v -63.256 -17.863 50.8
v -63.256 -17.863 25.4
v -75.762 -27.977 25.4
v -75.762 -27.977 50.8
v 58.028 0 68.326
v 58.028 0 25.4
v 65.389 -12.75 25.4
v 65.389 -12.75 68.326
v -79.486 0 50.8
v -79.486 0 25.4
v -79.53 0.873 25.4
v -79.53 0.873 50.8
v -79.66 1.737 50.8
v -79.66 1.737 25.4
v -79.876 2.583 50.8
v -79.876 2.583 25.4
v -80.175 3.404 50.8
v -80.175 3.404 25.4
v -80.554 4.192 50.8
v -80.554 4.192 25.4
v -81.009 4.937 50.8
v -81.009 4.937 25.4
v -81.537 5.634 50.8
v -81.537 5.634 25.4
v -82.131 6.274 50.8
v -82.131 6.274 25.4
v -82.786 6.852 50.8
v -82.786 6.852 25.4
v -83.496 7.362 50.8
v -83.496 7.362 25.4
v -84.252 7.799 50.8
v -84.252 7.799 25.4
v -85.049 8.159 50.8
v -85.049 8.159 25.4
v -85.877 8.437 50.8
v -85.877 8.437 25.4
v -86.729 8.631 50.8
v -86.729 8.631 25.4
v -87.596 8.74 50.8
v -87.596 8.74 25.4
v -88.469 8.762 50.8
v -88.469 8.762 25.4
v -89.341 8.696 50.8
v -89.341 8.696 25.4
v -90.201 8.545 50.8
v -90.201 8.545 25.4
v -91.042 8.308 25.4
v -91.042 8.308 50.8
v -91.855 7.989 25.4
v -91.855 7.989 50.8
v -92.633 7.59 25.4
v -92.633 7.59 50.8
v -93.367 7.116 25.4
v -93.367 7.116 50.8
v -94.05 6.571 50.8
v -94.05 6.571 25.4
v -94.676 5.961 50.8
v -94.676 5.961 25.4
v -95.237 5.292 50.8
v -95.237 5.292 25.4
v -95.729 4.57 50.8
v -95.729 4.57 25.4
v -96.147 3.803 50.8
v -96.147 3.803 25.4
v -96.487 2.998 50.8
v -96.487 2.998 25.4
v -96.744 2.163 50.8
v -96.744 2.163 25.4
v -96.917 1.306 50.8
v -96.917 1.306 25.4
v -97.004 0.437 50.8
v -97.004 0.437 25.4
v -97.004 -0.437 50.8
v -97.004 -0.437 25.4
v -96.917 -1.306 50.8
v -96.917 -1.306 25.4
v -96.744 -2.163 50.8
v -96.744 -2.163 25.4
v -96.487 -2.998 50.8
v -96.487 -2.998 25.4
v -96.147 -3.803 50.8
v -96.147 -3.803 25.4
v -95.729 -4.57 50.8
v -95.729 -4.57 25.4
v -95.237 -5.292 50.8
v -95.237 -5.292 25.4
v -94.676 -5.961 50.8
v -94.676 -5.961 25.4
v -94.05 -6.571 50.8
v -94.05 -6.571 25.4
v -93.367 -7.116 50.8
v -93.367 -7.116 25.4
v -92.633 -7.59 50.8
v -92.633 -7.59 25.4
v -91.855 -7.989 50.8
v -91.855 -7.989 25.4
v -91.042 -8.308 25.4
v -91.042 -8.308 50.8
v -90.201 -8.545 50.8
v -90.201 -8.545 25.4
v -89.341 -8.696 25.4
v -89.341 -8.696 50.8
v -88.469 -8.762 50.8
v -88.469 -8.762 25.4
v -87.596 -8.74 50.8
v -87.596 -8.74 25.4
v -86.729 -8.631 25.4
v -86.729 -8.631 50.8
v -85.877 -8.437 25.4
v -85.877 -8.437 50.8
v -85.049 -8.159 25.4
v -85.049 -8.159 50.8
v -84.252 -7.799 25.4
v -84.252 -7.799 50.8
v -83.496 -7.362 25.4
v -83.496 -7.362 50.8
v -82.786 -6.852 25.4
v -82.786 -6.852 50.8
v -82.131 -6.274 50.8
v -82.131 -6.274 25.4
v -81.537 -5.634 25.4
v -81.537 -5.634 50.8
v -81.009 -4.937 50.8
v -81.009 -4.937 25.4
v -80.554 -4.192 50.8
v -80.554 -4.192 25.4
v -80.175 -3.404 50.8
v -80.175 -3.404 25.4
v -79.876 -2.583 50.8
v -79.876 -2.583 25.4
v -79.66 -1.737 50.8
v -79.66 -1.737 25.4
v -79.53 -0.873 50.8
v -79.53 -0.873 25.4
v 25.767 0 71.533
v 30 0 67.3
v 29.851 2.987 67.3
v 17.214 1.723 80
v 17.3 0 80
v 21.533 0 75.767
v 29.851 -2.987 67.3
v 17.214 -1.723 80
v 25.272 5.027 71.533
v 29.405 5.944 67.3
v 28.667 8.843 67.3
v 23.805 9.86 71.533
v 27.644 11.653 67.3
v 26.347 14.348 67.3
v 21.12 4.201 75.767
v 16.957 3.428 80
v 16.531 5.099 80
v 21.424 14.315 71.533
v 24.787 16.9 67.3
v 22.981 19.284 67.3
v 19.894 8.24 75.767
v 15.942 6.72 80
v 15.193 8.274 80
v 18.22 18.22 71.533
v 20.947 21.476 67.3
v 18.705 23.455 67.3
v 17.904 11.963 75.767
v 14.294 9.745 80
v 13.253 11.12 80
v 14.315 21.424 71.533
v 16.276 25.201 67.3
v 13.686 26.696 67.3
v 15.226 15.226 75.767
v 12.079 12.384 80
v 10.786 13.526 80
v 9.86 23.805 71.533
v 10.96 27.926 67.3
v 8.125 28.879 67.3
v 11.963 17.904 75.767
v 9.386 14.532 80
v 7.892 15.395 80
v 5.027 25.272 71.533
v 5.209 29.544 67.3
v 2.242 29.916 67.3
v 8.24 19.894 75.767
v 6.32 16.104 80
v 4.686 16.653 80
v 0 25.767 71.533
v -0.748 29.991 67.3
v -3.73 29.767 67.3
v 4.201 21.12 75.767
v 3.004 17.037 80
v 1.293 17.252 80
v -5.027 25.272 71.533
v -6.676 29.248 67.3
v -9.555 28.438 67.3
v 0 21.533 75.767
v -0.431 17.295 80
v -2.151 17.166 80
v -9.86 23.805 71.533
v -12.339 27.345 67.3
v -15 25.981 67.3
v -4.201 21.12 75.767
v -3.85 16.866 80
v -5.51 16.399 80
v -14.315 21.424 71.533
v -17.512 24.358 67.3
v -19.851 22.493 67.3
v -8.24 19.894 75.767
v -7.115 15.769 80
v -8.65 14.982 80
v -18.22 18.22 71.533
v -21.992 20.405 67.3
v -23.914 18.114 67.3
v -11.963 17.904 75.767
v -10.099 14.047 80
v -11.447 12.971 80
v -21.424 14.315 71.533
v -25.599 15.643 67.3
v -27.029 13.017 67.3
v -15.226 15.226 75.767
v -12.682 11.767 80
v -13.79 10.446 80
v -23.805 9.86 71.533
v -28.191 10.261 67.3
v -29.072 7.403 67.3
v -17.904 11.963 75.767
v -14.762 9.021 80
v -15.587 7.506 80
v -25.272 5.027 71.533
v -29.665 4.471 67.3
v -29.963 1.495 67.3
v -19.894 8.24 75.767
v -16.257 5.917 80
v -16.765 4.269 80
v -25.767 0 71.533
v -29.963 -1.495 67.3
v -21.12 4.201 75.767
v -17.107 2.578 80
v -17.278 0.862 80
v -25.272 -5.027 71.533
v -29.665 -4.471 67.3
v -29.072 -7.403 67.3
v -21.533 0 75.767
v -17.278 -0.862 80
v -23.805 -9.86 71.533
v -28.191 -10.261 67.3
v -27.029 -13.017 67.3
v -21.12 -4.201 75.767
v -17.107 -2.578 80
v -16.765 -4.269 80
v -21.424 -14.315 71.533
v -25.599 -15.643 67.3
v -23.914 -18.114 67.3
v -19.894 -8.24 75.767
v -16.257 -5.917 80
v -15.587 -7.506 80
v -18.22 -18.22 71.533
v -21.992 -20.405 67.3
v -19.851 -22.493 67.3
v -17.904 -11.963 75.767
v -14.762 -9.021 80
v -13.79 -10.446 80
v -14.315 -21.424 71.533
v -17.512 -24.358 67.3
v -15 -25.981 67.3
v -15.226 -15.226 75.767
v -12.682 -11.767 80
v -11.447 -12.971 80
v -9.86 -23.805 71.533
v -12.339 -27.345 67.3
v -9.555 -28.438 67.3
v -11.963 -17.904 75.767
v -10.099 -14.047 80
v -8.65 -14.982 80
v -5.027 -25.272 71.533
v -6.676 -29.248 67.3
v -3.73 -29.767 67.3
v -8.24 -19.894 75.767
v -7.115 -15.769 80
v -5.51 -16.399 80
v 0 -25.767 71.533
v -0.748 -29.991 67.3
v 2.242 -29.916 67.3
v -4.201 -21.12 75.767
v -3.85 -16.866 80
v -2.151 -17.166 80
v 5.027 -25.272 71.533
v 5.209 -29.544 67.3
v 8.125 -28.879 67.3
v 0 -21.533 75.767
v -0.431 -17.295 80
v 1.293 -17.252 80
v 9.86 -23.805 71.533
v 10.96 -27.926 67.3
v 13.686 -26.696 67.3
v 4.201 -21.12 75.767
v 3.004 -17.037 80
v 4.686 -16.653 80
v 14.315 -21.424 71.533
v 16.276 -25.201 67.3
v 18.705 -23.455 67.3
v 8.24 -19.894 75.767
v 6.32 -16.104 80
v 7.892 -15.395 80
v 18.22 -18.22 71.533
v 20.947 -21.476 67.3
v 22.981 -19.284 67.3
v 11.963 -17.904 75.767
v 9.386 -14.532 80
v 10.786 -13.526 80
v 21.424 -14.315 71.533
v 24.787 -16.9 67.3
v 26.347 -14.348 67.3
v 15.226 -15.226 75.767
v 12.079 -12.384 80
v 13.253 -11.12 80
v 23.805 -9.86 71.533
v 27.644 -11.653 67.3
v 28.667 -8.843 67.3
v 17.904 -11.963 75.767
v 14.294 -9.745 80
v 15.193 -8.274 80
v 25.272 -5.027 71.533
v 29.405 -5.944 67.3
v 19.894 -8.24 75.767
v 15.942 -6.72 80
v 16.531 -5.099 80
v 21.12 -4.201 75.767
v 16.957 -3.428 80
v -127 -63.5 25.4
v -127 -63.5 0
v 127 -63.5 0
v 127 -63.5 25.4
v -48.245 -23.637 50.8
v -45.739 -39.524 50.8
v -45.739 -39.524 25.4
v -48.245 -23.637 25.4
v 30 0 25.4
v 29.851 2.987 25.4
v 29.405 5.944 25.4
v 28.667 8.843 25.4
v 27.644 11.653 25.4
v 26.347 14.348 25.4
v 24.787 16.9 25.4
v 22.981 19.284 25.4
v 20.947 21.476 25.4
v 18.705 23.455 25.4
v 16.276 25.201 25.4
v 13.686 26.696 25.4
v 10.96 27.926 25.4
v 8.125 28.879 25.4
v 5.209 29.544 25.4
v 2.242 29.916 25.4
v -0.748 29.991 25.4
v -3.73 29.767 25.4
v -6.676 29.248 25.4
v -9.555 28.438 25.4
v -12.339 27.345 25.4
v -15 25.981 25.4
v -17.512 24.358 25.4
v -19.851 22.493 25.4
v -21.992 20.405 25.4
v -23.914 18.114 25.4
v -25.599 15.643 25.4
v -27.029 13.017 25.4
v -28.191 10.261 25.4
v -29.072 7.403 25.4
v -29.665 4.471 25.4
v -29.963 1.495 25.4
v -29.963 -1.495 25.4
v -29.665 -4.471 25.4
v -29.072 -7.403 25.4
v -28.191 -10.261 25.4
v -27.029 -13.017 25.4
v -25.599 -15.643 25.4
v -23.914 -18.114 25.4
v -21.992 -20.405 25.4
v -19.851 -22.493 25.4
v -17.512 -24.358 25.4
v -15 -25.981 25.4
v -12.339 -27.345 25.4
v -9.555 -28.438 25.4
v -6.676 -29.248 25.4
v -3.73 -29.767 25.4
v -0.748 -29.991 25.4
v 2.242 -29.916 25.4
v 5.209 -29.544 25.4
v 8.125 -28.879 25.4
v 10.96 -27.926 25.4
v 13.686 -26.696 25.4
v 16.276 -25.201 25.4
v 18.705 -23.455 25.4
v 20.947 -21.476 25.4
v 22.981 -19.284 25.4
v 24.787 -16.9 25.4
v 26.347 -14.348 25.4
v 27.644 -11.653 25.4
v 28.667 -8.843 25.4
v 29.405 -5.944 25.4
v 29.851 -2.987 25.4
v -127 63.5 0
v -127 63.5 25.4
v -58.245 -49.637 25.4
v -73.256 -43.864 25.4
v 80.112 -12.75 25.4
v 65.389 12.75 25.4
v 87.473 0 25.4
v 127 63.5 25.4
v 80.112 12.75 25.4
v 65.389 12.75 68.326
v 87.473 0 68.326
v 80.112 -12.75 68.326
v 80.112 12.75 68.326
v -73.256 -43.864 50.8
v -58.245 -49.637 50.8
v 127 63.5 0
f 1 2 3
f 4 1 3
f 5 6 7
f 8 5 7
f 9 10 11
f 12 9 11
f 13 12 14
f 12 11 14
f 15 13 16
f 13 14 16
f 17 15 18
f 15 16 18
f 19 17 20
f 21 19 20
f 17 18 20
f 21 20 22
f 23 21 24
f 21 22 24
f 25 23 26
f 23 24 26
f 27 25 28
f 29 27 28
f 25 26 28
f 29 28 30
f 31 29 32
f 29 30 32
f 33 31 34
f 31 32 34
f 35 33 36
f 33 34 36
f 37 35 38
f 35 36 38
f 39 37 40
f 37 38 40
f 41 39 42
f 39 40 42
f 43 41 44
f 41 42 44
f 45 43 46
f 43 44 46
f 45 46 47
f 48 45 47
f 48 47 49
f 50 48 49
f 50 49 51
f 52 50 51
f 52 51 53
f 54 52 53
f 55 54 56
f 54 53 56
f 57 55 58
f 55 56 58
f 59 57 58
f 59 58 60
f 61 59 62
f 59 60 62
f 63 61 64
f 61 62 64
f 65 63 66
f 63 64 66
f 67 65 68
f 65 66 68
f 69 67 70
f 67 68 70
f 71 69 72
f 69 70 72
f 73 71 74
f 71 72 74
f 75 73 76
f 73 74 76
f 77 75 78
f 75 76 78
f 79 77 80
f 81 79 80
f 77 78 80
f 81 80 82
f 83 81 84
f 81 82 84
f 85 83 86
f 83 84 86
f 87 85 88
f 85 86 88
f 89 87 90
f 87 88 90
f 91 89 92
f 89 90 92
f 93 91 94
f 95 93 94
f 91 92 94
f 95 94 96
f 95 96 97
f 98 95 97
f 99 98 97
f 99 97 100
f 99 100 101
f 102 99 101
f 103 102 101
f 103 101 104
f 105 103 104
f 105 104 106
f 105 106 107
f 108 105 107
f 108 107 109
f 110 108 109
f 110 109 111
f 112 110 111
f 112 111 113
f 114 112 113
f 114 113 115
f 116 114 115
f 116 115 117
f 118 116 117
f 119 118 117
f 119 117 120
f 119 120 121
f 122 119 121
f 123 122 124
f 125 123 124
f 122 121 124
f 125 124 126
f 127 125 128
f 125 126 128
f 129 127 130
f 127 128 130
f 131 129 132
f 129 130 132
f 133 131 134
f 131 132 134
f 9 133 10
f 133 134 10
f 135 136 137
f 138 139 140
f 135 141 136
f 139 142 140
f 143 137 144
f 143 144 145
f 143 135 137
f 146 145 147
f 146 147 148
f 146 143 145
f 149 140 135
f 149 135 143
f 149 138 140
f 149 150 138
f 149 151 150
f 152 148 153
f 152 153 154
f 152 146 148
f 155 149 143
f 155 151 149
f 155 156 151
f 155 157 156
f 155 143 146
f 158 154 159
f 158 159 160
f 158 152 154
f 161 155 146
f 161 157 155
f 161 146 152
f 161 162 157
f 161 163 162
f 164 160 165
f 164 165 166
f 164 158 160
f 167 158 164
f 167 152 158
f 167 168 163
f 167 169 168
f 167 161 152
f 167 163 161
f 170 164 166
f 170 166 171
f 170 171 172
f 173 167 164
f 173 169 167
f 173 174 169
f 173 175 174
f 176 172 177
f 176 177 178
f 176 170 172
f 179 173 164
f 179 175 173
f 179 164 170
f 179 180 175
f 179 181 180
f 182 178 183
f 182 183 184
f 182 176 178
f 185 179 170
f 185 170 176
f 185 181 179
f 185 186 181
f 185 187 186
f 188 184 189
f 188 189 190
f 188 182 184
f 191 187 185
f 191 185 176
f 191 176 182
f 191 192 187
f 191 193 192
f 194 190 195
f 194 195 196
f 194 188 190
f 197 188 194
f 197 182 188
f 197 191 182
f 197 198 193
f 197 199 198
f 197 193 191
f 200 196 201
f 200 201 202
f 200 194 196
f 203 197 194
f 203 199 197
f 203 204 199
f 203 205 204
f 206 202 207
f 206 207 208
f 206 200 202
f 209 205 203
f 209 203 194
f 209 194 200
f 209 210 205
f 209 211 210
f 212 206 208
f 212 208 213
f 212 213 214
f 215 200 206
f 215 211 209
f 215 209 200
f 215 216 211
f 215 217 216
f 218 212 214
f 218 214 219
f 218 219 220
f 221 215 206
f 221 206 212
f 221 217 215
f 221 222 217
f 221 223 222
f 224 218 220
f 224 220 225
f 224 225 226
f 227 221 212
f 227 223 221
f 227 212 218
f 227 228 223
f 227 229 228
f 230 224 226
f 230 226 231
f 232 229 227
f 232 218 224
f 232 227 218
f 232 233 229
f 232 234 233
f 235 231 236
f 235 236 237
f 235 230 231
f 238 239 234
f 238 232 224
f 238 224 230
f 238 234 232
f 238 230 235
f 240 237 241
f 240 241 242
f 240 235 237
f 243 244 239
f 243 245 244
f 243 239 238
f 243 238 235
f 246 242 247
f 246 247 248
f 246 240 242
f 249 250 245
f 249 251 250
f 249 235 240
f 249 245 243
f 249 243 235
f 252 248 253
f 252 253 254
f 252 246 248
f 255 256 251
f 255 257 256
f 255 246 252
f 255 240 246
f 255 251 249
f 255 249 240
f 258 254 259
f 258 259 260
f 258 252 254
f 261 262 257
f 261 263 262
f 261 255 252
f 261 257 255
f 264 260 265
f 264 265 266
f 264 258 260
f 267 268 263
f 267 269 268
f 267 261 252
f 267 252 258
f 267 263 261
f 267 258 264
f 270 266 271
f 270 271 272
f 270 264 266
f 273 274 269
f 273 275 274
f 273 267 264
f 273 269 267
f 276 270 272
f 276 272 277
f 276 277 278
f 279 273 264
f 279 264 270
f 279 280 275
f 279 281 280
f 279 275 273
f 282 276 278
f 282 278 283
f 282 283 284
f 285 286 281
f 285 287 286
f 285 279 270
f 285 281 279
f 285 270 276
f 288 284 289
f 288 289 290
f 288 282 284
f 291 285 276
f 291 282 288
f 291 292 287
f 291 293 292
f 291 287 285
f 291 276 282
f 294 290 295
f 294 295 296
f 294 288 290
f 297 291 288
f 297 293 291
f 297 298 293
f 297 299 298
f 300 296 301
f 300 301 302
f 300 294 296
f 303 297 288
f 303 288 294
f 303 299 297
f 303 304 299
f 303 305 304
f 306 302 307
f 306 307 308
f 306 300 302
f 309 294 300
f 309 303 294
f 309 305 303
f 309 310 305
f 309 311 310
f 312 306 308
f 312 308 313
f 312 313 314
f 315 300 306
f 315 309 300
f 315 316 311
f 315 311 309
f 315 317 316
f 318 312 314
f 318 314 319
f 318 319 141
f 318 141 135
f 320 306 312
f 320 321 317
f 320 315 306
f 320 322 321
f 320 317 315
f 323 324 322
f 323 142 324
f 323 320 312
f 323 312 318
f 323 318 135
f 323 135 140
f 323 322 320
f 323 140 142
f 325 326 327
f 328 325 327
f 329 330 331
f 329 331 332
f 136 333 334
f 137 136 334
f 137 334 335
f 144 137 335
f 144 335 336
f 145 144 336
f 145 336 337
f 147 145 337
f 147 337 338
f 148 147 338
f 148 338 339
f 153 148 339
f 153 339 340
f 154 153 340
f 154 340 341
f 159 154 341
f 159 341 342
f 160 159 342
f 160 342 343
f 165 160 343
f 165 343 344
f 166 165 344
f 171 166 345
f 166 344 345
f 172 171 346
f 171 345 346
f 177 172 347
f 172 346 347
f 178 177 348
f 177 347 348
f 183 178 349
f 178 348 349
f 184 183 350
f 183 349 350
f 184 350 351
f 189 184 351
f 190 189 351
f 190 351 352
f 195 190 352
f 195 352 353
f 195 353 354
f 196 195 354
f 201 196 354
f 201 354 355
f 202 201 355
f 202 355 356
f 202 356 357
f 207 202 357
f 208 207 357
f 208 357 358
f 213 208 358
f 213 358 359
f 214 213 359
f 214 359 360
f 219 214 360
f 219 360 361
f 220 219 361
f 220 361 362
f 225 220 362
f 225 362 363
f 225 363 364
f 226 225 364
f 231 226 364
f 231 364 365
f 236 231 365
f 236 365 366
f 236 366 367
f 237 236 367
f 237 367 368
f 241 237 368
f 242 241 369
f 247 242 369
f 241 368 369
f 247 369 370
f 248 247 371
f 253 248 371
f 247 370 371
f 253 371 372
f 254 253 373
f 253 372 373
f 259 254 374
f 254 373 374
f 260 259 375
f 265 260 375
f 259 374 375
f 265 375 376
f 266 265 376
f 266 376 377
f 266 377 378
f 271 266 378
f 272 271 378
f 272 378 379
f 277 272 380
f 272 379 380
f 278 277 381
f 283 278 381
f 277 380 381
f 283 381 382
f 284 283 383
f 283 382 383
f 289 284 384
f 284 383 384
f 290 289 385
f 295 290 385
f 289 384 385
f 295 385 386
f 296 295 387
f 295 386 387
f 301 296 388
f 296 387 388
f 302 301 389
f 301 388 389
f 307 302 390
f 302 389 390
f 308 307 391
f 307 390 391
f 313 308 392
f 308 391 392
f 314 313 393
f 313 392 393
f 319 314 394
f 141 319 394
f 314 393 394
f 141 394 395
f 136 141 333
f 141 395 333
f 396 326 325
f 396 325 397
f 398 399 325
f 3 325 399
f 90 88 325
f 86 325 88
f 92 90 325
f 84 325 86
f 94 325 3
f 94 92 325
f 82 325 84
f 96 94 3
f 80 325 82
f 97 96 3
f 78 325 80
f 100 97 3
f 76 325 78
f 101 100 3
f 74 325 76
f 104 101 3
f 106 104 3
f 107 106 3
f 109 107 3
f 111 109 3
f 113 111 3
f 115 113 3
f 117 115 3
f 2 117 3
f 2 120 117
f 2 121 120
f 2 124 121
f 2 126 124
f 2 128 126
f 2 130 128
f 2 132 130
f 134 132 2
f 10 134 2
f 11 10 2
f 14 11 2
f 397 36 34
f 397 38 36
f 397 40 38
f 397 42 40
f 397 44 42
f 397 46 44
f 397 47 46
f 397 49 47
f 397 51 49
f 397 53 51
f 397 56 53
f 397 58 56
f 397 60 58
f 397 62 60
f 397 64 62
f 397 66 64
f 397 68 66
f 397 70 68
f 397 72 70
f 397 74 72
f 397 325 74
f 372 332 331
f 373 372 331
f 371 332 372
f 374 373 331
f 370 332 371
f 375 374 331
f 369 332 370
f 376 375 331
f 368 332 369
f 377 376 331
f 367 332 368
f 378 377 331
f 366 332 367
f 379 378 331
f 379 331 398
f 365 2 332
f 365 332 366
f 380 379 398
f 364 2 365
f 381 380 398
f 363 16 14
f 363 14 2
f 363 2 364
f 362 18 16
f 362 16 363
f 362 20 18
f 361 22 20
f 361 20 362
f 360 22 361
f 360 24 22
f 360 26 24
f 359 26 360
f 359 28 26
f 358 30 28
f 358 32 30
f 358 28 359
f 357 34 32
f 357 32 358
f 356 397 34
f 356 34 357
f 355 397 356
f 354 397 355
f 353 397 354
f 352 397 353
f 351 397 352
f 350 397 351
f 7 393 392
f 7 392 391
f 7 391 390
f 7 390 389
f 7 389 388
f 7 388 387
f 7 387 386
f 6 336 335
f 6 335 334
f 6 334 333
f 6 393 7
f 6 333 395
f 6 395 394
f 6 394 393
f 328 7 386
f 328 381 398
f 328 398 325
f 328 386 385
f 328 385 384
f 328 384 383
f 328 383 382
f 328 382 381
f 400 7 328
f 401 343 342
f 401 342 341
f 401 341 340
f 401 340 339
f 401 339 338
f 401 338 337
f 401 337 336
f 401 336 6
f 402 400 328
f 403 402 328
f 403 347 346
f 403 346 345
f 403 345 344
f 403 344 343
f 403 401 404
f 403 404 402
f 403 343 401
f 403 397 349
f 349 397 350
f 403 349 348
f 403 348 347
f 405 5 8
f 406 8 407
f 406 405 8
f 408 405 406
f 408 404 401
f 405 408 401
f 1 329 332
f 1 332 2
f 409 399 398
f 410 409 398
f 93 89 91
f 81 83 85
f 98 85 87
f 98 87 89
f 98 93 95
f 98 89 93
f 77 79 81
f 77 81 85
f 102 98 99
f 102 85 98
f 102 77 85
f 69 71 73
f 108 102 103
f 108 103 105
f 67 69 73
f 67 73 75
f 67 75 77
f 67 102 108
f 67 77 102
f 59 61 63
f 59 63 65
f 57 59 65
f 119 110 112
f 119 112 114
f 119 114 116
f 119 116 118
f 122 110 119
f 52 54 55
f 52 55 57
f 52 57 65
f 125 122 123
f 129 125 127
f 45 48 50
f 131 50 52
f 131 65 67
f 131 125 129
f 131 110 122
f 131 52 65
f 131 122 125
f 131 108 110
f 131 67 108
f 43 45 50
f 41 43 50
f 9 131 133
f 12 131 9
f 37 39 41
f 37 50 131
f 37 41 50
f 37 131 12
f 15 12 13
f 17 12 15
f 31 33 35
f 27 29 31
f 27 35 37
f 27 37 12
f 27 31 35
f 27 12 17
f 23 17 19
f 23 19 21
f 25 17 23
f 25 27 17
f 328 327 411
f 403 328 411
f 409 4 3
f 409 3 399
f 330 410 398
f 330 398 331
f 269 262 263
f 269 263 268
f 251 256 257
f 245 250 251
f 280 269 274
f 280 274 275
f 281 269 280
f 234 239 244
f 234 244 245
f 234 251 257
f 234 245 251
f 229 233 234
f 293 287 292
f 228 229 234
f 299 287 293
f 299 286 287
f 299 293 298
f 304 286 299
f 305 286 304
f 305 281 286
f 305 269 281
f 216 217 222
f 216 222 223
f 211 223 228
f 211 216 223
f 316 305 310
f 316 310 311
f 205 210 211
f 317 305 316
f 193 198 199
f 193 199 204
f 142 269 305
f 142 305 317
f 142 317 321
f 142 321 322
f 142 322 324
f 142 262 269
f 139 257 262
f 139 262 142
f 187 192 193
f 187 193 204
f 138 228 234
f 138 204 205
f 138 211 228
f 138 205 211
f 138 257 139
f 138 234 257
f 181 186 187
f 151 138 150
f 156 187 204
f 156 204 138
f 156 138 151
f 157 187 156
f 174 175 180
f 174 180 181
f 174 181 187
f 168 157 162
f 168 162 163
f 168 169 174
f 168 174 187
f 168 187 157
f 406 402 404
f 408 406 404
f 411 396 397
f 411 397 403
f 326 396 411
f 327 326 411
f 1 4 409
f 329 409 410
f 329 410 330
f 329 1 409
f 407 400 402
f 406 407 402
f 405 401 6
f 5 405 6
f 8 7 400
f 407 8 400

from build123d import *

# Parameters (mm, degrees)
F0_R      = 30
F1_DEPTH  = 80
F2_W      = 254
F2_H      = 127
F3_DEPTH  = 25.4
F4_SIZE   = 12.7
F5_R      = 8.764352
F6_DEPTH  = 25.4
F8_DEPTH  = 42.926
F10_DEPTH = 25.4


with BuildPart() as f1:
    # F0 (on Top) → F1 (new body)
    with BuildSketch(Plane.XY):
        Circle(F0_R)
    extrude(amount=F1_DEPTH)

    # F2 (on Top) → F3 (join)
    with BuildSketch(Plane.XY):
        Rectangle(F2_W, F2_H)
    extrude(amount=F3_DEPTH)

    # F4
    f4_edges = [f1.edges().sort_by_distance(p)[0] for p in [
        (-30, 0, 80),
    ]]
    chamfer(f4_edges, length=F4_SIZE)

    # F5 (on face) → F6 (join)
    with BuildSketch(Plane.XY.offset(25.4)):
        with Locations((-88.250794, 0)):
            Circle(F5_R)
    extrude(amount=F6_DEPTH)

    # F7 (on face) → F8 (join)
    with BuildSketch(Plane.XY.offset(25.4)):
        Polygon((80.111949, 12.750117), (65.389382, 12.750117), (58.028098, 0), (65.389382, -12.750117), (80.111949, -12.750117), (87.473232, 0), align=None)
    extrude(amount=F8_DEPTH)

    # F9 (on face) → F10 (join)
    with BuildSketch(Plane.XY.offset(25.4)):
        Polygon((-48.244875, -23.636972), (-63.256118, -17.863414), (-75.761787, -27.976753), (-73.256213, -43.863649), (-58.24497, -49.637207), (-45.739301, -39.523868), align=None)
    extrude(amount=F10_DEPTH)


solid = f1.part
